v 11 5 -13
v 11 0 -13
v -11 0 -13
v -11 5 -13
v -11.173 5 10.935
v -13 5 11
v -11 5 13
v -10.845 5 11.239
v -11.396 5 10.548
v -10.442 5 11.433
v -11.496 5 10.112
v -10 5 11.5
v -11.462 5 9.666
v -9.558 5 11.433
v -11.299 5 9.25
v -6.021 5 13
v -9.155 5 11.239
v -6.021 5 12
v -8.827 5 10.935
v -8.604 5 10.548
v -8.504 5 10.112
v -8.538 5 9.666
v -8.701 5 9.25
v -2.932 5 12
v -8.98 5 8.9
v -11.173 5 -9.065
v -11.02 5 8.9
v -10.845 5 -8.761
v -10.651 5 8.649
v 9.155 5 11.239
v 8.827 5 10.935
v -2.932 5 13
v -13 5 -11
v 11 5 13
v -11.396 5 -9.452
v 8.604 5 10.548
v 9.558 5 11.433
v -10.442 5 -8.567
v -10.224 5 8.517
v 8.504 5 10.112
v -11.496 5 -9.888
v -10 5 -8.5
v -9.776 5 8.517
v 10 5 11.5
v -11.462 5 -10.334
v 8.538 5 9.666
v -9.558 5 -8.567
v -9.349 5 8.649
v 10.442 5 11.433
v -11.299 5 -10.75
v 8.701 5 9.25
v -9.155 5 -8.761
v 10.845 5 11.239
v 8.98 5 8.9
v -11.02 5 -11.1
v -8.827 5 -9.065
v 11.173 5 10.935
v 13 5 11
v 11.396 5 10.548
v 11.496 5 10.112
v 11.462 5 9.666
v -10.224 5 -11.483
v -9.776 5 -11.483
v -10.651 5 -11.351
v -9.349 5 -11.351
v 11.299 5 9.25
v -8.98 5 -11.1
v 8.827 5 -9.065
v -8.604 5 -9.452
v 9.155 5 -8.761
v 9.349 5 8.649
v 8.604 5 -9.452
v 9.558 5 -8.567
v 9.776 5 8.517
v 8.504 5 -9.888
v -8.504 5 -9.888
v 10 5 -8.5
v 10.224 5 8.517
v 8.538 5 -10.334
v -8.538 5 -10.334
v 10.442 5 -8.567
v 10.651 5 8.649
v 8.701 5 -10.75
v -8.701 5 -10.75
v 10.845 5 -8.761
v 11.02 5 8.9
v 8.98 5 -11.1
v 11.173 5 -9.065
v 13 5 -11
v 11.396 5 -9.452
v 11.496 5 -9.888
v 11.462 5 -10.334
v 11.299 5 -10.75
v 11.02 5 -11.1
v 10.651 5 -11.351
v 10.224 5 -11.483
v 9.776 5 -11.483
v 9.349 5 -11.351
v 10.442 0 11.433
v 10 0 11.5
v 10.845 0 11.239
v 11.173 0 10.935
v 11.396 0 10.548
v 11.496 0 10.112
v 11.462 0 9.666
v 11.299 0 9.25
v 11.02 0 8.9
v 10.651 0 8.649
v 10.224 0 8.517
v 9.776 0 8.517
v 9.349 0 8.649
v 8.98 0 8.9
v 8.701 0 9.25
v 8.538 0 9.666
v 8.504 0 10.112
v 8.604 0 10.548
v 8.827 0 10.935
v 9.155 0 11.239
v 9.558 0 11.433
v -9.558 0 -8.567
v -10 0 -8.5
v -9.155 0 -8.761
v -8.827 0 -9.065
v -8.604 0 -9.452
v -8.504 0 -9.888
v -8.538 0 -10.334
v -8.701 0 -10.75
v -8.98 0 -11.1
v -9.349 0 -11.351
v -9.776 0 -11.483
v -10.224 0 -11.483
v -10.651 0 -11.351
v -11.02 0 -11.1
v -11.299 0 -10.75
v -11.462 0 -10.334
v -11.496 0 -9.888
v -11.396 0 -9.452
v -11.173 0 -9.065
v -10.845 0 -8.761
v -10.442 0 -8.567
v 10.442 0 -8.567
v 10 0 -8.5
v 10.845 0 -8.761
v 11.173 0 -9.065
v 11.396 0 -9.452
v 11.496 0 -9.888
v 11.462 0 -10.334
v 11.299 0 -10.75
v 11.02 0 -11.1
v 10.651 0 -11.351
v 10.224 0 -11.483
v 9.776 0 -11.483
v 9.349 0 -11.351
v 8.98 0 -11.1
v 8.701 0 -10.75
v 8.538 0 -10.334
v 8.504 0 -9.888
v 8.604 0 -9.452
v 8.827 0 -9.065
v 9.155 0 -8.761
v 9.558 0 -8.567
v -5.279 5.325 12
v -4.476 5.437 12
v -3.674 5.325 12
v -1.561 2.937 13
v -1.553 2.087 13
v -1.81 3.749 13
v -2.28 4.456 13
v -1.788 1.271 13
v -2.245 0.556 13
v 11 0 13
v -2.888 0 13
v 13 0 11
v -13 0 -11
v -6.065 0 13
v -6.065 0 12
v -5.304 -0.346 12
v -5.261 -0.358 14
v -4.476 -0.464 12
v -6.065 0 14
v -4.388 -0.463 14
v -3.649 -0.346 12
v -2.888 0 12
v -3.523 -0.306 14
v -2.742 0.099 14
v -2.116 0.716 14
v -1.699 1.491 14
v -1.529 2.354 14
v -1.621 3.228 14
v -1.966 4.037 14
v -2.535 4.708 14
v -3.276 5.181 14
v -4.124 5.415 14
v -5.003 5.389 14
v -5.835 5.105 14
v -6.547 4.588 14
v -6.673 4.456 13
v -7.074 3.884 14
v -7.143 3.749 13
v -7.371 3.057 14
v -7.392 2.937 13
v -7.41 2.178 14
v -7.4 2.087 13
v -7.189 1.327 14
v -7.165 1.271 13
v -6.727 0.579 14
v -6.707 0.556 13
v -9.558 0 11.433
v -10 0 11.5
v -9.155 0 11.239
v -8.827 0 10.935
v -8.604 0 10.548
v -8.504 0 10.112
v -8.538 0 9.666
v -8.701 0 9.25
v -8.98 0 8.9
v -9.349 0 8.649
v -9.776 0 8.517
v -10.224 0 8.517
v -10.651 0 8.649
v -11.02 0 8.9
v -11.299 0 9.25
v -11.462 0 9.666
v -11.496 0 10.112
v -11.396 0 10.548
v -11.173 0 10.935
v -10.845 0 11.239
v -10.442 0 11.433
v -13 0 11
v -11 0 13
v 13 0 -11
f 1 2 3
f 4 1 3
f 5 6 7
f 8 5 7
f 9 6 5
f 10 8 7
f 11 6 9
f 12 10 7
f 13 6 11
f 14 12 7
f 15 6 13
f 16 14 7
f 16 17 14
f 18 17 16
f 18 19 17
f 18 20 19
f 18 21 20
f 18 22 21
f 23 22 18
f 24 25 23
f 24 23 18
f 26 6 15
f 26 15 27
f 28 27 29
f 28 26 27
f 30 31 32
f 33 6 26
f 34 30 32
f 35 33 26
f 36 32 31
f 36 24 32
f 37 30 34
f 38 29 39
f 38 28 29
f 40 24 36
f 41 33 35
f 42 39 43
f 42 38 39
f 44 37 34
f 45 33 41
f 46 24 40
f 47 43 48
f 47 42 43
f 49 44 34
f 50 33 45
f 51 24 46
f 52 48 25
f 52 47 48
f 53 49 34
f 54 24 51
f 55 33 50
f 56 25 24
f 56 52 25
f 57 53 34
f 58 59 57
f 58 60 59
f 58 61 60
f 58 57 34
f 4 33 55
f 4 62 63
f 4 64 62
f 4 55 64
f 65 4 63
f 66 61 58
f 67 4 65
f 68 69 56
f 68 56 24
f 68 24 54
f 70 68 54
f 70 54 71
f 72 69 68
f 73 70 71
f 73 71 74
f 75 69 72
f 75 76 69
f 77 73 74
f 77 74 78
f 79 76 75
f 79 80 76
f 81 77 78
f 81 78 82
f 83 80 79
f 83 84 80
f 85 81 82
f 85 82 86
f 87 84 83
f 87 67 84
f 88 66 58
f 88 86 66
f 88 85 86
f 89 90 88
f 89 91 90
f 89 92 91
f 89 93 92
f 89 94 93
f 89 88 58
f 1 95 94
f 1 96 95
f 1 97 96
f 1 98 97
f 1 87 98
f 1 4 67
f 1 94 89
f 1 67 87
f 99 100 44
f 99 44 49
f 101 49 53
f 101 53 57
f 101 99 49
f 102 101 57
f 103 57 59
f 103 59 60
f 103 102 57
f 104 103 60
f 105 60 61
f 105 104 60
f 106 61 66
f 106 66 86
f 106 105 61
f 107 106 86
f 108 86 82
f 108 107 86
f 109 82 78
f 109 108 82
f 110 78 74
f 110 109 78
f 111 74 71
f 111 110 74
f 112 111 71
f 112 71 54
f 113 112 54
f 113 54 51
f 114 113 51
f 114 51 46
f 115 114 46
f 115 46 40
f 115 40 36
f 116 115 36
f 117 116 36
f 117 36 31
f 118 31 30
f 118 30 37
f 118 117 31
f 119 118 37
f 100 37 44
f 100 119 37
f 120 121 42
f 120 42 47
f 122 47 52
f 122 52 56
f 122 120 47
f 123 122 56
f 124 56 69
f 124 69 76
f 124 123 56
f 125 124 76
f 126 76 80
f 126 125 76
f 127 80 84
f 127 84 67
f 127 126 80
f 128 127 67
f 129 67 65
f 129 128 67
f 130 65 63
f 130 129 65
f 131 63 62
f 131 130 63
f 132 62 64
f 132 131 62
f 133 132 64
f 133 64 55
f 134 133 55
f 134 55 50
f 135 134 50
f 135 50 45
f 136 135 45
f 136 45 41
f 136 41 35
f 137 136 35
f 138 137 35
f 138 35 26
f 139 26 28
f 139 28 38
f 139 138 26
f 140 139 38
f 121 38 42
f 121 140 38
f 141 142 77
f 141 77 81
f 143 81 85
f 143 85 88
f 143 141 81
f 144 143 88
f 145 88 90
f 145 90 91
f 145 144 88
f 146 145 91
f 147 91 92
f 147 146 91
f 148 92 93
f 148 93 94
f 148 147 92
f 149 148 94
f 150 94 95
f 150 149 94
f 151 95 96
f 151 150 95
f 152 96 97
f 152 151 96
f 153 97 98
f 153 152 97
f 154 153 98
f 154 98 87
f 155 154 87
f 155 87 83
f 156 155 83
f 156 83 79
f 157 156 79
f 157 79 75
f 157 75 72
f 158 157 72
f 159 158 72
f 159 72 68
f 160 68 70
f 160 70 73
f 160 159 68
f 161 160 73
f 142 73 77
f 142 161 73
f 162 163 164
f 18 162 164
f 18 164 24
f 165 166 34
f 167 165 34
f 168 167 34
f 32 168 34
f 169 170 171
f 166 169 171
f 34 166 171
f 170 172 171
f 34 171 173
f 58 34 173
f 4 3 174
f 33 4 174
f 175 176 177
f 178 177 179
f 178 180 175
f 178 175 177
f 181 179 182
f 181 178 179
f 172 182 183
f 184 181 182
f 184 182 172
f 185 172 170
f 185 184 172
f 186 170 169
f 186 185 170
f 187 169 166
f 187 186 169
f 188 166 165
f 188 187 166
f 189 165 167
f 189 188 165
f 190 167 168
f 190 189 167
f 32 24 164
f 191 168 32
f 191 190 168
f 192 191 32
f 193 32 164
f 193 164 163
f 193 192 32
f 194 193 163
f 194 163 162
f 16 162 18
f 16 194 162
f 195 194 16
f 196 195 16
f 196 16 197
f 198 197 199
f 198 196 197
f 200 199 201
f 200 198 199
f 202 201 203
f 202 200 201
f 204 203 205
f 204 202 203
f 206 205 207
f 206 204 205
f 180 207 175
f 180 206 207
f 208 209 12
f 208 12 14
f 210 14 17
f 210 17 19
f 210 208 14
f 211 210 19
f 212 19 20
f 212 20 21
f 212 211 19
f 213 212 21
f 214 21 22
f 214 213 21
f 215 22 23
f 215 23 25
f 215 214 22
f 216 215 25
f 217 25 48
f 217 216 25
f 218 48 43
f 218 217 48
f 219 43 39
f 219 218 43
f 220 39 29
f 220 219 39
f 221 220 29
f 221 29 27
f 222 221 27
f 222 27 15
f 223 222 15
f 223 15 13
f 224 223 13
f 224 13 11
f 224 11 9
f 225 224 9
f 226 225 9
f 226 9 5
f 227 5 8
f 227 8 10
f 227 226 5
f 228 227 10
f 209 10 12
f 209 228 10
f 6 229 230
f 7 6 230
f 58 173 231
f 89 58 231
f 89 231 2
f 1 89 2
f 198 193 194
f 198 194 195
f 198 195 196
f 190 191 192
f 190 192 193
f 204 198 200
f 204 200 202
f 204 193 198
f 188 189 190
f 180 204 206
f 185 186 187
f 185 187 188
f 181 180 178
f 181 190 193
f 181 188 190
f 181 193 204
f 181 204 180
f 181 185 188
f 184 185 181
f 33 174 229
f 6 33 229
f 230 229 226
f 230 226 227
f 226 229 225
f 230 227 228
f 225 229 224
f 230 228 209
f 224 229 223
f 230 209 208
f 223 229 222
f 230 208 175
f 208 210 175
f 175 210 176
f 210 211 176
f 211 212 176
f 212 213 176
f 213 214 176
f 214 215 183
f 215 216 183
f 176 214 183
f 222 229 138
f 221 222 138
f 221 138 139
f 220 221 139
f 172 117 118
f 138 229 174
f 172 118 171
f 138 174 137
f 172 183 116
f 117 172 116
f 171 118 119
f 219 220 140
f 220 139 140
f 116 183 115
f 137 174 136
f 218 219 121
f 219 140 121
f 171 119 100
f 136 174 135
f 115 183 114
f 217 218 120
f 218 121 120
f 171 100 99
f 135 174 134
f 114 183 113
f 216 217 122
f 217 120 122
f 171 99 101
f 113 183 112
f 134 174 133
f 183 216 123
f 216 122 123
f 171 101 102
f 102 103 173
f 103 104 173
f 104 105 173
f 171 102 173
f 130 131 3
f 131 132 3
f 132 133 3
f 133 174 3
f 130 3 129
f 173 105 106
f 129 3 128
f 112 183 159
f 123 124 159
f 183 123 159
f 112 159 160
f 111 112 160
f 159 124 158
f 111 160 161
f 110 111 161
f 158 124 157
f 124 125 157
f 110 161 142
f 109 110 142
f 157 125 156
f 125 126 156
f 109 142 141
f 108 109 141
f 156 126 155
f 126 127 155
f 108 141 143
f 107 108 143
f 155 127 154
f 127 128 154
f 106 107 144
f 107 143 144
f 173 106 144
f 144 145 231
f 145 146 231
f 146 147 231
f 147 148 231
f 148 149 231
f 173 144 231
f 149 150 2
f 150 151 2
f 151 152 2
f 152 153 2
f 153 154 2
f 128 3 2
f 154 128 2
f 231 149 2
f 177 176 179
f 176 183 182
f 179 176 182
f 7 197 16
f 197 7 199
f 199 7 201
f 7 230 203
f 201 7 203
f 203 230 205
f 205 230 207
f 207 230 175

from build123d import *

# Parameters (mm, degrees)
SKETCH1_R           = 1.5
BOSS_EXTRUDE1_DEPTH = 5
SKETCH2_R           = 2.950338073
BOSS_EXTRUDE2_DEPTH = 1


with BuildPart() as part:
    # Sketch1 → Boss-Extrude1 (new body)
    with BuildSketch(Plane(origin=(0, 0, 0), x_dir=(1, 0, 0), z_dir=(0, 1, 0))):
        Polygon((-11, 13), (-13, 11), (-13, -11), (-11, -13), (11, -13), (13, -11), (13, 11), (11, 13), align=None)
        with Locations(Location((-10, 10, 0), (0, 0, 270))):
            Circle(SKETCH1_R, mode=Mode.SUBTRACT)
        with Locations(Location((10, 10, 0), (0, 0, 270))):
            Circle(SKETCH1_R, mode=Mode.SUBTRACT)
        with Locations(Location((10, -10, 0), (0, 0, 270))):
            Circle(SKETCH1_R, mode=Mode.SUBTRACT)
        with Locations(Location((-10, -10, 0), (0, 0, 270))):
            Circle(SKETCH1_R, mode=Mode.SUBTRACT)
    extrude(amount=BOSS_EXTRUDE1_DEPTH)

    # Sketch2 → Boss-Extrude2 (add, symmetric)
    with BuildSketch(Plane.XY.offset(13)):
        with Locations(Location((-4.476260218, 2.486184382, 0), (0, 0, 237.423977883))):
            Circle(SKETCH2_R)
    extrude(amount=BOSS_EXTRUDE2_DEPTH, both=True)


solid = part.part
